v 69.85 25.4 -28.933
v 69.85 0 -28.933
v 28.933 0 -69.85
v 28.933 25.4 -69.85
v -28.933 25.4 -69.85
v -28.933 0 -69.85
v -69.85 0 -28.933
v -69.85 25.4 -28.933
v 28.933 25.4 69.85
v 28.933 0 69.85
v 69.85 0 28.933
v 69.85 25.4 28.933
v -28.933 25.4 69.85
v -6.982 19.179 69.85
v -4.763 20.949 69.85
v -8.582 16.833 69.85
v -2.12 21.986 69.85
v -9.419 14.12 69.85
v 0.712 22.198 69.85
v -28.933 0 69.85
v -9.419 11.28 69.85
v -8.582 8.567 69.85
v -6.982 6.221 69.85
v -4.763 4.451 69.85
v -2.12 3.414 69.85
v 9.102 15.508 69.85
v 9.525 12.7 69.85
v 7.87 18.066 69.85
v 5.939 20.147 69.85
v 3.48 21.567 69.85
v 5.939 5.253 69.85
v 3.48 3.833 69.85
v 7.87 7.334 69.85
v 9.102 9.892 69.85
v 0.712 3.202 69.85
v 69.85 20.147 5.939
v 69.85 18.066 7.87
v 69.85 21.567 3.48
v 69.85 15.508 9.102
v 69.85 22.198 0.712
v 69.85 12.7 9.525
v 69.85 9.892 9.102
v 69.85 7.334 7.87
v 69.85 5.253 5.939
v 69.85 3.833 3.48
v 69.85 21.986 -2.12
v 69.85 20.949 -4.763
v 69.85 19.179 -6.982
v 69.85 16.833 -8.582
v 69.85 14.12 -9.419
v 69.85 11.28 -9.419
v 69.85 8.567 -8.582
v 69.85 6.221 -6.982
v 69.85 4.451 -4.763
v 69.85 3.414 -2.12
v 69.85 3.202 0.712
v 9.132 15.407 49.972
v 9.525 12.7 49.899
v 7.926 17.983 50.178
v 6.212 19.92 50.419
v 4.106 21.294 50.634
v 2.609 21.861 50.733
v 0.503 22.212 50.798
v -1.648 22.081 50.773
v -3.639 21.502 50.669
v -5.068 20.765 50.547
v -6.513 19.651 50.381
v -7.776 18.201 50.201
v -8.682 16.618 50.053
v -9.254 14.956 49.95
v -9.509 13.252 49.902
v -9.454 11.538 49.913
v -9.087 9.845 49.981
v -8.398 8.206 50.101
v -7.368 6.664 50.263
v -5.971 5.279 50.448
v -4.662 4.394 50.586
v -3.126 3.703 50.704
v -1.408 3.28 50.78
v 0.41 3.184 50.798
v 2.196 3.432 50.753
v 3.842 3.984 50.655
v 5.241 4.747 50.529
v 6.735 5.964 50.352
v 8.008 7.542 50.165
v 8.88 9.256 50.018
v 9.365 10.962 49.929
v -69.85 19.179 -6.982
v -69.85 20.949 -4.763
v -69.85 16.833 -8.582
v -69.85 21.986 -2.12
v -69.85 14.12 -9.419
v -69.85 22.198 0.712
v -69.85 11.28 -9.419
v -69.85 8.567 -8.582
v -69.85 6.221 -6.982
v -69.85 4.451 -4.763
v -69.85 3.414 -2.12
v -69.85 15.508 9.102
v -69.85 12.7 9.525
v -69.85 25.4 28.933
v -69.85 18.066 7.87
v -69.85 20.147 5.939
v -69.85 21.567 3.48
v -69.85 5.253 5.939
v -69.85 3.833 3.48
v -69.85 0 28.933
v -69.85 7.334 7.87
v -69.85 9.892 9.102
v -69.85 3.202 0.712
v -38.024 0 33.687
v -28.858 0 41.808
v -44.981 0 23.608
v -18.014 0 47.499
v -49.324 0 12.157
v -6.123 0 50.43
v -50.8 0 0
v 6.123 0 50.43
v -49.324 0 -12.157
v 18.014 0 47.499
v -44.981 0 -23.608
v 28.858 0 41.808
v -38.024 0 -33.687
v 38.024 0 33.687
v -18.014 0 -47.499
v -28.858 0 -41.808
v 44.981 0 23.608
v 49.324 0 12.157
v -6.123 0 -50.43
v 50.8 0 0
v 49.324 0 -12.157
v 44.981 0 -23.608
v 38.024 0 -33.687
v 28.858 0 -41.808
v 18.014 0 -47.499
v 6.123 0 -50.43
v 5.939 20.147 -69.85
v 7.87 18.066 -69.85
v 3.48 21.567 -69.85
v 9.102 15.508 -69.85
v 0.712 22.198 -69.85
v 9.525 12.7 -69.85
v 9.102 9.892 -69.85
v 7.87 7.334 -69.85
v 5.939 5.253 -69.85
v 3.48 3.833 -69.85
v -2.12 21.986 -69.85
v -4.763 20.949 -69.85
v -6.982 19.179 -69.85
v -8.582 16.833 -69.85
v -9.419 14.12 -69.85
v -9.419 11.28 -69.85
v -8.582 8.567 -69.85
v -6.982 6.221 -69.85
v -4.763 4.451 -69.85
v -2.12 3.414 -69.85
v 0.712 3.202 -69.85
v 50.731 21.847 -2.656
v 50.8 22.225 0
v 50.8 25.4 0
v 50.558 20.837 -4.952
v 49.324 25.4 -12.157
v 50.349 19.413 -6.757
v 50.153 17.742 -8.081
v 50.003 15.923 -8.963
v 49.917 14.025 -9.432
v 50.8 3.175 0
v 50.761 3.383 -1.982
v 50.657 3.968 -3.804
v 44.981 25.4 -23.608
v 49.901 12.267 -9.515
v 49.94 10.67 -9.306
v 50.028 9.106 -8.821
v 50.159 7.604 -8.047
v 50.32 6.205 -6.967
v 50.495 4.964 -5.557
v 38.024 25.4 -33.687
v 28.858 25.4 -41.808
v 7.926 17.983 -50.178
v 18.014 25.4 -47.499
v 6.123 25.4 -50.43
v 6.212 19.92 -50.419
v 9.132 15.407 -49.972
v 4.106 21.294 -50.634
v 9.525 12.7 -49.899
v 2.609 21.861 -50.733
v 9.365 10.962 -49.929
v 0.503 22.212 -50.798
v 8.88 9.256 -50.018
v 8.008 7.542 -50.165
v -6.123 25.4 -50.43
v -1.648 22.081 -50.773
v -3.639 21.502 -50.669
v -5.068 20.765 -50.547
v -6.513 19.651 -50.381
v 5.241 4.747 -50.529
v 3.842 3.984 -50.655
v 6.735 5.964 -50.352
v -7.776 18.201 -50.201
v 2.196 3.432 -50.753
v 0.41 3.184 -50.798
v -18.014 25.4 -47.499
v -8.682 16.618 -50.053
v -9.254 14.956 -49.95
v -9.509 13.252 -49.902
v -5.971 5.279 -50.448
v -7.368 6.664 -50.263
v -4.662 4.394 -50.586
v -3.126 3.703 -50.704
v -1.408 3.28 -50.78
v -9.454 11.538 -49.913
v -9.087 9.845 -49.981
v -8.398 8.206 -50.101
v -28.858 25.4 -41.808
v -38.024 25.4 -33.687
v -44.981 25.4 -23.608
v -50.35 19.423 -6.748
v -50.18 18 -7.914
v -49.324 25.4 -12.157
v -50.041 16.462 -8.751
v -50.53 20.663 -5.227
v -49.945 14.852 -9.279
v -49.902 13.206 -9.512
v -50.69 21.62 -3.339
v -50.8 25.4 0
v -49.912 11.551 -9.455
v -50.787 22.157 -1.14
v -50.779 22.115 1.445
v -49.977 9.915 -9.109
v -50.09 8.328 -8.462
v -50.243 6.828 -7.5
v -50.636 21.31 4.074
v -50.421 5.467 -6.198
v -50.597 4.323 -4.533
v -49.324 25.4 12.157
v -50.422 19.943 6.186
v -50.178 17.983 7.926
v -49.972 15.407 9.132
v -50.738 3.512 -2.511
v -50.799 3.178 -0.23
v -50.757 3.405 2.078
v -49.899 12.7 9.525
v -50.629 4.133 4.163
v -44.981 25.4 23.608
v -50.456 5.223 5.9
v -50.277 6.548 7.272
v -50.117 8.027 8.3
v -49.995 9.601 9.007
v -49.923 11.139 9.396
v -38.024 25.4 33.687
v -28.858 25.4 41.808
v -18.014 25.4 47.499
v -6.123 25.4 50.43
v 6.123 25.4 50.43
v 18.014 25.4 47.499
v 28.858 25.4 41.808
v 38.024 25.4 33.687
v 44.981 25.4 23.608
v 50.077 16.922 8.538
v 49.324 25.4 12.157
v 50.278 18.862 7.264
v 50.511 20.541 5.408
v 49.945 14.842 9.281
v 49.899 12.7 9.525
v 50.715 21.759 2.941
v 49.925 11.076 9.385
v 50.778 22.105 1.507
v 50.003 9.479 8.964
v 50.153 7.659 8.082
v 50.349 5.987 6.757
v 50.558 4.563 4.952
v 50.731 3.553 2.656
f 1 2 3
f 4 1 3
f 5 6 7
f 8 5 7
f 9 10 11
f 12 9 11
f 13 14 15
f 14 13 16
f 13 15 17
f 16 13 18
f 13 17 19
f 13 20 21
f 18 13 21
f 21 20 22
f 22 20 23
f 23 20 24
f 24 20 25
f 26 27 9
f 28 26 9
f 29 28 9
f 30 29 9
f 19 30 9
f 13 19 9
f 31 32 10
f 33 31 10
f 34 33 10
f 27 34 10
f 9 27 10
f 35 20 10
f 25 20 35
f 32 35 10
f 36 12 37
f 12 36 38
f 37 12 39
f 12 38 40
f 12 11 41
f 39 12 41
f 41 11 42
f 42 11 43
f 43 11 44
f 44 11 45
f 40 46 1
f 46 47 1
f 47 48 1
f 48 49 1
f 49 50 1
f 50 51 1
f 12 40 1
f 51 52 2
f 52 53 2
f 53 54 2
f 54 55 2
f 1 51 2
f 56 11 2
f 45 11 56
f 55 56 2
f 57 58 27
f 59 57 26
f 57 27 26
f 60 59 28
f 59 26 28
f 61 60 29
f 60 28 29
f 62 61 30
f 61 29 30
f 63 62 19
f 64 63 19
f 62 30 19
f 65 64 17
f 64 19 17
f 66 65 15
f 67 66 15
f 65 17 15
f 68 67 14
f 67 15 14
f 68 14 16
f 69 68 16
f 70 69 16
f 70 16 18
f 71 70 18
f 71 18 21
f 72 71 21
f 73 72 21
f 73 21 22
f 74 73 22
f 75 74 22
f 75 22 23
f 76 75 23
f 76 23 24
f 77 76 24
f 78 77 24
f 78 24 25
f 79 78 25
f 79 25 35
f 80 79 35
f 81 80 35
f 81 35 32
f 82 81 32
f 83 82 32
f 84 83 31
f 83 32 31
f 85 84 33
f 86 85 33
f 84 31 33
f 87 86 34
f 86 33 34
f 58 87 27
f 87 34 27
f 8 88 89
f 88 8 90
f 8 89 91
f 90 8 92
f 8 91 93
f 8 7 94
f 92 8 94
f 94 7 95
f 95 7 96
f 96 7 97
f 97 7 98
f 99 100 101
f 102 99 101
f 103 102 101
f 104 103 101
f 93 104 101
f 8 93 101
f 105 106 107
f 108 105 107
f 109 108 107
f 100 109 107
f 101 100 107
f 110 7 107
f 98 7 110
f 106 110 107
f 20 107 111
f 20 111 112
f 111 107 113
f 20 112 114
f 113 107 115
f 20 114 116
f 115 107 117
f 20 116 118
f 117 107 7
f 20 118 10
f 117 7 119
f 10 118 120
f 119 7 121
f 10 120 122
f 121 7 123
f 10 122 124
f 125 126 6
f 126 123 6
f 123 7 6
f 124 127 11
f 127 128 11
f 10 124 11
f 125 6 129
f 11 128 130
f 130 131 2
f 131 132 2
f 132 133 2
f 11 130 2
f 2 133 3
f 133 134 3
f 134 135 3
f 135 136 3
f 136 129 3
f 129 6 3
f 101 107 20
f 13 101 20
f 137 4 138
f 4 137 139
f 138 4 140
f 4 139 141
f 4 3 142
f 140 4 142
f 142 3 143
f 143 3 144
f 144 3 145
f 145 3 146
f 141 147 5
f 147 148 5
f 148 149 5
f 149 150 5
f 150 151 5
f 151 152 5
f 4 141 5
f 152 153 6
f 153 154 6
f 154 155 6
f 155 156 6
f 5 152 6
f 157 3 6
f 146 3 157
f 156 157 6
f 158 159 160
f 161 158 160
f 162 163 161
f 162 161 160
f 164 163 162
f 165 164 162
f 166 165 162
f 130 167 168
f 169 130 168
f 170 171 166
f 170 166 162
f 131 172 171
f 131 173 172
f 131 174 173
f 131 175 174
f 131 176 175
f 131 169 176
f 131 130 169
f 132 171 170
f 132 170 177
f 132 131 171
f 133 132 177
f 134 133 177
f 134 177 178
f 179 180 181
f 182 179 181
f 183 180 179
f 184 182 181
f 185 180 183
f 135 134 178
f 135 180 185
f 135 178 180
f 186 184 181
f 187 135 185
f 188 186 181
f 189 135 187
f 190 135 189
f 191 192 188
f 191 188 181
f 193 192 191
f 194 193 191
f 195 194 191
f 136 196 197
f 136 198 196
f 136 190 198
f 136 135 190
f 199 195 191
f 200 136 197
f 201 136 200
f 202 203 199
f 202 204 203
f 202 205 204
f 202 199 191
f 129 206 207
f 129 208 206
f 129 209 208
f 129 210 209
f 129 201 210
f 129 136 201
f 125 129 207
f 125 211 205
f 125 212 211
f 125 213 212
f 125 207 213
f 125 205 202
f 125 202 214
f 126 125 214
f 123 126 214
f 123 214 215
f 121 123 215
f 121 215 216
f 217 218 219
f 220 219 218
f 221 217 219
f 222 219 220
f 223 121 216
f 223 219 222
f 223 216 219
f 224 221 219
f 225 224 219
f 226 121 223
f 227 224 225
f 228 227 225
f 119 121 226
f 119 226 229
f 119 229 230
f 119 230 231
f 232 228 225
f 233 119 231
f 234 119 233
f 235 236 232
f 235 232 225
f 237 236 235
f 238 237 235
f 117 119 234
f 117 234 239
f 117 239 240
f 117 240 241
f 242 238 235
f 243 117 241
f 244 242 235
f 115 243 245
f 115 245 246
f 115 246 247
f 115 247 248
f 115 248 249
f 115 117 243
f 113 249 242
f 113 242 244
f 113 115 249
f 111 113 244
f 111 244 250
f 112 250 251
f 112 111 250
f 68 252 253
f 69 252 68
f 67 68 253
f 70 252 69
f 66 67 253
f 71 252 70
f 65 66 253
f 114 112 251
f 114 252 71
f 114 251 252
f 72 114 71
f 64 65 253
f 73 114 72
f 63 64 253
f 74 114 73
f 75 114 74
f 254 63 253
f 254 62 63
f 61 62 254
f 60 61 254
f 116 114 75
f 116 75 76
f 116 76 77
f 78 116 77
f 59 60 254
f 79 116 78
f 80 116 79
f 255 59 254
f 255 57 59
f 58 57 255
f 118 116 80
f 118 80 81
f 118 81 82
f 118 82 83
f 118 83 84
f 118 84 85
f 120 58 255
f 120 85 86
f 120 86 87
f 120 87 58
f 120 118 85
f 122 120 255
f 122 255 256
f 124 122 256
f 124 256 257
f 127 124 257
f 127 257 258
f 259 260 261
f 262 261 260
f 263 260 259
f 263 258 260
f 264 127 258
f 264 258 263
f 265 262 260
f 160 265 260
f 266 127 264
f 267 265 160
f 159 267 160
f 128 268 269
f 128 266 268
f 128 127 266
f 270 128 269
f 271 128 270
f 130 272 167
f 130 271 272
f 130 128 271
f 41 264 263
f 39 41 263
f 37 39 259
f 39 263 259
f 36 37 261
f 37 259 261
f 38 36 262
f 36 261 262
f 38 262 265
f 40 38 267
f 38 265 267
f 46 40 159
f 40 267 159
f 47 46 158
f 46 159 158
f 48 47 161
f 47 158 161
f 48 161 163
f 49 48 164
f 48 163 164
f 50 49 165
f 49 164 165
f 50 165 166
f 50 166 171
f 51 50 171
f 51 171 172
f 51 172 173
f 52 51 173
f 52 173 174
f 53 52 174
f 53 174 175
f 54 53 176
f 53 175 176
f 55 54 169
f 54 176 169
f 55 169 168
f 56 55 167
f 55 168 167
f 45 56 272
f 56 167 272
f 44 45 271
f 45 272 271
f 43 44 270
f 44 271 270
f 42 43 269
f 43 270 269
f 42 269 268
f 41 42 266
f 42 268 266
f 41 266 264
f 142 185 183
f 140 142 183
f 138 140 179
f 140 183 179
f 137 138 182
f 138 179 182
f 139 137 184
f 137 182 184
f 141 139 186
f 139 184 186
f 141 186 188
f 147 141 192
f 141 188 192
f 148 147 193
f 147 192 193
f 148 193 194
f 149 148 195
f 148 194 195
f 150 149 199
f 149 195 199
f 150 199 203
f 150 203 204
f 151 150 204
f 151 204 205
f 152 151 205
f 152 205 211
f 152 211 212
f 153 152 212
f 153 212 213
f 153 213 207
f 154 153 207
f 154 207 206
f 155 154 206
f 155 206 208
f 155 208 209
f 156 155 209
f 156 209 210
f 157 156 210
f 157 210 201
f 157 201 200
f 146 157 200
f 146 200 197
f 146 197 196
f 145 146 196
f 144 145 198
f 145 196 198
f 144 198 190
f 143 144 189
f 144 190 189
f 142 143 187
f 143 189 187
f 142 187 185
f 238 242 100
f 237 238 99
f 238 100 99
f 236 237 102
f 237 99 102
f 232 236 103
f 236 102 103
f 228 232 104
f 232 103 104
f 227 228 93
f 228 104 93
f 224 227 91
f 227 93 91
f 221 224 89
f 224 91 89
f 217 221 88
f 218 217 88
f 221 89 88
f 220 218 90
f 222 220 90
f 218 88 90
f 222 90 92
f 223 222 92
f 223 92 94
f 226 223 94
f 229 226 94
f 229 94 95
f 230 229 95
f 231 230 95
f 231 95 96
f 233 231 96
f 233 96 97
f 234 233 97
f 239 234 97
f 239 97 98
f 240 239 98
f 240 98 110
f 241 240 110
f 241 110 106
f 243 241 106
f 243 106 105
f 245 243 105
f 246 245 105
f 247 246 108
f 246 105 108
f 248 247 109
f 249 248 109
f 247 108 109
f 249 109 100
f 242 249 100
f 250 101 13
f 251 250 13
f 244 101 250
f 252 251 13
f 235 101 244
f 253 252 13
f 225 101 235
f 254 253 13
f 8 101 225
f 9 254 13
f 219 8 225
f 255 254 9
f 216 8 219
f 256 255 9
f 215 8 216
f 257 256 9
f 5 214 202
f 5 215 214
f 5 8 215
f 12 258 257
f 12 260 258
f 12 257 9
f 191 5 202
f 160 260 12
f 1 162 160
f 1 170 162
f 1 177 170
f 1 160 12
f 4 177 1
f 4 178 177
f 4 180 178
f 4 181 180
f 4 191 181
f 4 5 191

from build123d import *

# Parameters (mm, degrees)
SKETCH2_R           = 50.8
BOSS_EXTRUDE1_DEPTH = 25.4
SKETCH3_R           = 9.525
CUT_EXTRUDE1_DEPTH  = 140.7
SKETCH4_R           = 9.525
CUT_EXTRUDE2_DEPTH  = 140.7


with BuildPart() as part:
    # Sketch2 → Boss-Extrude1 (new body)
    with BuildSketch(Plane(origin=(0, 0, 0), x_dir=(1, 0, 0), z_dir=(0, 1, 0))):
        Polygon((69.85, 28.932817332), (28.932817332, 69.85), (-28.932817332, 69.85), (-69.85, 28.932817332), (-69.85, -28.932817332), (-28.932817332, -69.85), (28.932817332, -69.85), (69.85, -28.932817332), align=None)
        Circle(SKETCH2_R, mode=Mode.SUBTRACT)
    extrude(amount=BOSS_EXTRUDE1_DEPTH)

    # Sketch3 → Cut-Extrude1 (cut, through all)
    with BuildSketch(Plane.XY.offset(69.85)):
        with Locations((0, 12.7)):
            Circle(SKETCH3_R)
    extrude(amount=-CUT_EXTRUDE1_DEPTH, mode=Mode.SUBTRACT)

    # Sketch4 → Cut-Extrude2 (cut, through all)
    with BuildSketch(Plane.ZY.offset(69.85)):
        with Locations((0, 12.7)):
            Circle(SKETCH4_R)
    extrude(amount=-CUT_EXTRUDE2_DEPTH, mode=Mode.SUBTRACT)


solid = part.part
